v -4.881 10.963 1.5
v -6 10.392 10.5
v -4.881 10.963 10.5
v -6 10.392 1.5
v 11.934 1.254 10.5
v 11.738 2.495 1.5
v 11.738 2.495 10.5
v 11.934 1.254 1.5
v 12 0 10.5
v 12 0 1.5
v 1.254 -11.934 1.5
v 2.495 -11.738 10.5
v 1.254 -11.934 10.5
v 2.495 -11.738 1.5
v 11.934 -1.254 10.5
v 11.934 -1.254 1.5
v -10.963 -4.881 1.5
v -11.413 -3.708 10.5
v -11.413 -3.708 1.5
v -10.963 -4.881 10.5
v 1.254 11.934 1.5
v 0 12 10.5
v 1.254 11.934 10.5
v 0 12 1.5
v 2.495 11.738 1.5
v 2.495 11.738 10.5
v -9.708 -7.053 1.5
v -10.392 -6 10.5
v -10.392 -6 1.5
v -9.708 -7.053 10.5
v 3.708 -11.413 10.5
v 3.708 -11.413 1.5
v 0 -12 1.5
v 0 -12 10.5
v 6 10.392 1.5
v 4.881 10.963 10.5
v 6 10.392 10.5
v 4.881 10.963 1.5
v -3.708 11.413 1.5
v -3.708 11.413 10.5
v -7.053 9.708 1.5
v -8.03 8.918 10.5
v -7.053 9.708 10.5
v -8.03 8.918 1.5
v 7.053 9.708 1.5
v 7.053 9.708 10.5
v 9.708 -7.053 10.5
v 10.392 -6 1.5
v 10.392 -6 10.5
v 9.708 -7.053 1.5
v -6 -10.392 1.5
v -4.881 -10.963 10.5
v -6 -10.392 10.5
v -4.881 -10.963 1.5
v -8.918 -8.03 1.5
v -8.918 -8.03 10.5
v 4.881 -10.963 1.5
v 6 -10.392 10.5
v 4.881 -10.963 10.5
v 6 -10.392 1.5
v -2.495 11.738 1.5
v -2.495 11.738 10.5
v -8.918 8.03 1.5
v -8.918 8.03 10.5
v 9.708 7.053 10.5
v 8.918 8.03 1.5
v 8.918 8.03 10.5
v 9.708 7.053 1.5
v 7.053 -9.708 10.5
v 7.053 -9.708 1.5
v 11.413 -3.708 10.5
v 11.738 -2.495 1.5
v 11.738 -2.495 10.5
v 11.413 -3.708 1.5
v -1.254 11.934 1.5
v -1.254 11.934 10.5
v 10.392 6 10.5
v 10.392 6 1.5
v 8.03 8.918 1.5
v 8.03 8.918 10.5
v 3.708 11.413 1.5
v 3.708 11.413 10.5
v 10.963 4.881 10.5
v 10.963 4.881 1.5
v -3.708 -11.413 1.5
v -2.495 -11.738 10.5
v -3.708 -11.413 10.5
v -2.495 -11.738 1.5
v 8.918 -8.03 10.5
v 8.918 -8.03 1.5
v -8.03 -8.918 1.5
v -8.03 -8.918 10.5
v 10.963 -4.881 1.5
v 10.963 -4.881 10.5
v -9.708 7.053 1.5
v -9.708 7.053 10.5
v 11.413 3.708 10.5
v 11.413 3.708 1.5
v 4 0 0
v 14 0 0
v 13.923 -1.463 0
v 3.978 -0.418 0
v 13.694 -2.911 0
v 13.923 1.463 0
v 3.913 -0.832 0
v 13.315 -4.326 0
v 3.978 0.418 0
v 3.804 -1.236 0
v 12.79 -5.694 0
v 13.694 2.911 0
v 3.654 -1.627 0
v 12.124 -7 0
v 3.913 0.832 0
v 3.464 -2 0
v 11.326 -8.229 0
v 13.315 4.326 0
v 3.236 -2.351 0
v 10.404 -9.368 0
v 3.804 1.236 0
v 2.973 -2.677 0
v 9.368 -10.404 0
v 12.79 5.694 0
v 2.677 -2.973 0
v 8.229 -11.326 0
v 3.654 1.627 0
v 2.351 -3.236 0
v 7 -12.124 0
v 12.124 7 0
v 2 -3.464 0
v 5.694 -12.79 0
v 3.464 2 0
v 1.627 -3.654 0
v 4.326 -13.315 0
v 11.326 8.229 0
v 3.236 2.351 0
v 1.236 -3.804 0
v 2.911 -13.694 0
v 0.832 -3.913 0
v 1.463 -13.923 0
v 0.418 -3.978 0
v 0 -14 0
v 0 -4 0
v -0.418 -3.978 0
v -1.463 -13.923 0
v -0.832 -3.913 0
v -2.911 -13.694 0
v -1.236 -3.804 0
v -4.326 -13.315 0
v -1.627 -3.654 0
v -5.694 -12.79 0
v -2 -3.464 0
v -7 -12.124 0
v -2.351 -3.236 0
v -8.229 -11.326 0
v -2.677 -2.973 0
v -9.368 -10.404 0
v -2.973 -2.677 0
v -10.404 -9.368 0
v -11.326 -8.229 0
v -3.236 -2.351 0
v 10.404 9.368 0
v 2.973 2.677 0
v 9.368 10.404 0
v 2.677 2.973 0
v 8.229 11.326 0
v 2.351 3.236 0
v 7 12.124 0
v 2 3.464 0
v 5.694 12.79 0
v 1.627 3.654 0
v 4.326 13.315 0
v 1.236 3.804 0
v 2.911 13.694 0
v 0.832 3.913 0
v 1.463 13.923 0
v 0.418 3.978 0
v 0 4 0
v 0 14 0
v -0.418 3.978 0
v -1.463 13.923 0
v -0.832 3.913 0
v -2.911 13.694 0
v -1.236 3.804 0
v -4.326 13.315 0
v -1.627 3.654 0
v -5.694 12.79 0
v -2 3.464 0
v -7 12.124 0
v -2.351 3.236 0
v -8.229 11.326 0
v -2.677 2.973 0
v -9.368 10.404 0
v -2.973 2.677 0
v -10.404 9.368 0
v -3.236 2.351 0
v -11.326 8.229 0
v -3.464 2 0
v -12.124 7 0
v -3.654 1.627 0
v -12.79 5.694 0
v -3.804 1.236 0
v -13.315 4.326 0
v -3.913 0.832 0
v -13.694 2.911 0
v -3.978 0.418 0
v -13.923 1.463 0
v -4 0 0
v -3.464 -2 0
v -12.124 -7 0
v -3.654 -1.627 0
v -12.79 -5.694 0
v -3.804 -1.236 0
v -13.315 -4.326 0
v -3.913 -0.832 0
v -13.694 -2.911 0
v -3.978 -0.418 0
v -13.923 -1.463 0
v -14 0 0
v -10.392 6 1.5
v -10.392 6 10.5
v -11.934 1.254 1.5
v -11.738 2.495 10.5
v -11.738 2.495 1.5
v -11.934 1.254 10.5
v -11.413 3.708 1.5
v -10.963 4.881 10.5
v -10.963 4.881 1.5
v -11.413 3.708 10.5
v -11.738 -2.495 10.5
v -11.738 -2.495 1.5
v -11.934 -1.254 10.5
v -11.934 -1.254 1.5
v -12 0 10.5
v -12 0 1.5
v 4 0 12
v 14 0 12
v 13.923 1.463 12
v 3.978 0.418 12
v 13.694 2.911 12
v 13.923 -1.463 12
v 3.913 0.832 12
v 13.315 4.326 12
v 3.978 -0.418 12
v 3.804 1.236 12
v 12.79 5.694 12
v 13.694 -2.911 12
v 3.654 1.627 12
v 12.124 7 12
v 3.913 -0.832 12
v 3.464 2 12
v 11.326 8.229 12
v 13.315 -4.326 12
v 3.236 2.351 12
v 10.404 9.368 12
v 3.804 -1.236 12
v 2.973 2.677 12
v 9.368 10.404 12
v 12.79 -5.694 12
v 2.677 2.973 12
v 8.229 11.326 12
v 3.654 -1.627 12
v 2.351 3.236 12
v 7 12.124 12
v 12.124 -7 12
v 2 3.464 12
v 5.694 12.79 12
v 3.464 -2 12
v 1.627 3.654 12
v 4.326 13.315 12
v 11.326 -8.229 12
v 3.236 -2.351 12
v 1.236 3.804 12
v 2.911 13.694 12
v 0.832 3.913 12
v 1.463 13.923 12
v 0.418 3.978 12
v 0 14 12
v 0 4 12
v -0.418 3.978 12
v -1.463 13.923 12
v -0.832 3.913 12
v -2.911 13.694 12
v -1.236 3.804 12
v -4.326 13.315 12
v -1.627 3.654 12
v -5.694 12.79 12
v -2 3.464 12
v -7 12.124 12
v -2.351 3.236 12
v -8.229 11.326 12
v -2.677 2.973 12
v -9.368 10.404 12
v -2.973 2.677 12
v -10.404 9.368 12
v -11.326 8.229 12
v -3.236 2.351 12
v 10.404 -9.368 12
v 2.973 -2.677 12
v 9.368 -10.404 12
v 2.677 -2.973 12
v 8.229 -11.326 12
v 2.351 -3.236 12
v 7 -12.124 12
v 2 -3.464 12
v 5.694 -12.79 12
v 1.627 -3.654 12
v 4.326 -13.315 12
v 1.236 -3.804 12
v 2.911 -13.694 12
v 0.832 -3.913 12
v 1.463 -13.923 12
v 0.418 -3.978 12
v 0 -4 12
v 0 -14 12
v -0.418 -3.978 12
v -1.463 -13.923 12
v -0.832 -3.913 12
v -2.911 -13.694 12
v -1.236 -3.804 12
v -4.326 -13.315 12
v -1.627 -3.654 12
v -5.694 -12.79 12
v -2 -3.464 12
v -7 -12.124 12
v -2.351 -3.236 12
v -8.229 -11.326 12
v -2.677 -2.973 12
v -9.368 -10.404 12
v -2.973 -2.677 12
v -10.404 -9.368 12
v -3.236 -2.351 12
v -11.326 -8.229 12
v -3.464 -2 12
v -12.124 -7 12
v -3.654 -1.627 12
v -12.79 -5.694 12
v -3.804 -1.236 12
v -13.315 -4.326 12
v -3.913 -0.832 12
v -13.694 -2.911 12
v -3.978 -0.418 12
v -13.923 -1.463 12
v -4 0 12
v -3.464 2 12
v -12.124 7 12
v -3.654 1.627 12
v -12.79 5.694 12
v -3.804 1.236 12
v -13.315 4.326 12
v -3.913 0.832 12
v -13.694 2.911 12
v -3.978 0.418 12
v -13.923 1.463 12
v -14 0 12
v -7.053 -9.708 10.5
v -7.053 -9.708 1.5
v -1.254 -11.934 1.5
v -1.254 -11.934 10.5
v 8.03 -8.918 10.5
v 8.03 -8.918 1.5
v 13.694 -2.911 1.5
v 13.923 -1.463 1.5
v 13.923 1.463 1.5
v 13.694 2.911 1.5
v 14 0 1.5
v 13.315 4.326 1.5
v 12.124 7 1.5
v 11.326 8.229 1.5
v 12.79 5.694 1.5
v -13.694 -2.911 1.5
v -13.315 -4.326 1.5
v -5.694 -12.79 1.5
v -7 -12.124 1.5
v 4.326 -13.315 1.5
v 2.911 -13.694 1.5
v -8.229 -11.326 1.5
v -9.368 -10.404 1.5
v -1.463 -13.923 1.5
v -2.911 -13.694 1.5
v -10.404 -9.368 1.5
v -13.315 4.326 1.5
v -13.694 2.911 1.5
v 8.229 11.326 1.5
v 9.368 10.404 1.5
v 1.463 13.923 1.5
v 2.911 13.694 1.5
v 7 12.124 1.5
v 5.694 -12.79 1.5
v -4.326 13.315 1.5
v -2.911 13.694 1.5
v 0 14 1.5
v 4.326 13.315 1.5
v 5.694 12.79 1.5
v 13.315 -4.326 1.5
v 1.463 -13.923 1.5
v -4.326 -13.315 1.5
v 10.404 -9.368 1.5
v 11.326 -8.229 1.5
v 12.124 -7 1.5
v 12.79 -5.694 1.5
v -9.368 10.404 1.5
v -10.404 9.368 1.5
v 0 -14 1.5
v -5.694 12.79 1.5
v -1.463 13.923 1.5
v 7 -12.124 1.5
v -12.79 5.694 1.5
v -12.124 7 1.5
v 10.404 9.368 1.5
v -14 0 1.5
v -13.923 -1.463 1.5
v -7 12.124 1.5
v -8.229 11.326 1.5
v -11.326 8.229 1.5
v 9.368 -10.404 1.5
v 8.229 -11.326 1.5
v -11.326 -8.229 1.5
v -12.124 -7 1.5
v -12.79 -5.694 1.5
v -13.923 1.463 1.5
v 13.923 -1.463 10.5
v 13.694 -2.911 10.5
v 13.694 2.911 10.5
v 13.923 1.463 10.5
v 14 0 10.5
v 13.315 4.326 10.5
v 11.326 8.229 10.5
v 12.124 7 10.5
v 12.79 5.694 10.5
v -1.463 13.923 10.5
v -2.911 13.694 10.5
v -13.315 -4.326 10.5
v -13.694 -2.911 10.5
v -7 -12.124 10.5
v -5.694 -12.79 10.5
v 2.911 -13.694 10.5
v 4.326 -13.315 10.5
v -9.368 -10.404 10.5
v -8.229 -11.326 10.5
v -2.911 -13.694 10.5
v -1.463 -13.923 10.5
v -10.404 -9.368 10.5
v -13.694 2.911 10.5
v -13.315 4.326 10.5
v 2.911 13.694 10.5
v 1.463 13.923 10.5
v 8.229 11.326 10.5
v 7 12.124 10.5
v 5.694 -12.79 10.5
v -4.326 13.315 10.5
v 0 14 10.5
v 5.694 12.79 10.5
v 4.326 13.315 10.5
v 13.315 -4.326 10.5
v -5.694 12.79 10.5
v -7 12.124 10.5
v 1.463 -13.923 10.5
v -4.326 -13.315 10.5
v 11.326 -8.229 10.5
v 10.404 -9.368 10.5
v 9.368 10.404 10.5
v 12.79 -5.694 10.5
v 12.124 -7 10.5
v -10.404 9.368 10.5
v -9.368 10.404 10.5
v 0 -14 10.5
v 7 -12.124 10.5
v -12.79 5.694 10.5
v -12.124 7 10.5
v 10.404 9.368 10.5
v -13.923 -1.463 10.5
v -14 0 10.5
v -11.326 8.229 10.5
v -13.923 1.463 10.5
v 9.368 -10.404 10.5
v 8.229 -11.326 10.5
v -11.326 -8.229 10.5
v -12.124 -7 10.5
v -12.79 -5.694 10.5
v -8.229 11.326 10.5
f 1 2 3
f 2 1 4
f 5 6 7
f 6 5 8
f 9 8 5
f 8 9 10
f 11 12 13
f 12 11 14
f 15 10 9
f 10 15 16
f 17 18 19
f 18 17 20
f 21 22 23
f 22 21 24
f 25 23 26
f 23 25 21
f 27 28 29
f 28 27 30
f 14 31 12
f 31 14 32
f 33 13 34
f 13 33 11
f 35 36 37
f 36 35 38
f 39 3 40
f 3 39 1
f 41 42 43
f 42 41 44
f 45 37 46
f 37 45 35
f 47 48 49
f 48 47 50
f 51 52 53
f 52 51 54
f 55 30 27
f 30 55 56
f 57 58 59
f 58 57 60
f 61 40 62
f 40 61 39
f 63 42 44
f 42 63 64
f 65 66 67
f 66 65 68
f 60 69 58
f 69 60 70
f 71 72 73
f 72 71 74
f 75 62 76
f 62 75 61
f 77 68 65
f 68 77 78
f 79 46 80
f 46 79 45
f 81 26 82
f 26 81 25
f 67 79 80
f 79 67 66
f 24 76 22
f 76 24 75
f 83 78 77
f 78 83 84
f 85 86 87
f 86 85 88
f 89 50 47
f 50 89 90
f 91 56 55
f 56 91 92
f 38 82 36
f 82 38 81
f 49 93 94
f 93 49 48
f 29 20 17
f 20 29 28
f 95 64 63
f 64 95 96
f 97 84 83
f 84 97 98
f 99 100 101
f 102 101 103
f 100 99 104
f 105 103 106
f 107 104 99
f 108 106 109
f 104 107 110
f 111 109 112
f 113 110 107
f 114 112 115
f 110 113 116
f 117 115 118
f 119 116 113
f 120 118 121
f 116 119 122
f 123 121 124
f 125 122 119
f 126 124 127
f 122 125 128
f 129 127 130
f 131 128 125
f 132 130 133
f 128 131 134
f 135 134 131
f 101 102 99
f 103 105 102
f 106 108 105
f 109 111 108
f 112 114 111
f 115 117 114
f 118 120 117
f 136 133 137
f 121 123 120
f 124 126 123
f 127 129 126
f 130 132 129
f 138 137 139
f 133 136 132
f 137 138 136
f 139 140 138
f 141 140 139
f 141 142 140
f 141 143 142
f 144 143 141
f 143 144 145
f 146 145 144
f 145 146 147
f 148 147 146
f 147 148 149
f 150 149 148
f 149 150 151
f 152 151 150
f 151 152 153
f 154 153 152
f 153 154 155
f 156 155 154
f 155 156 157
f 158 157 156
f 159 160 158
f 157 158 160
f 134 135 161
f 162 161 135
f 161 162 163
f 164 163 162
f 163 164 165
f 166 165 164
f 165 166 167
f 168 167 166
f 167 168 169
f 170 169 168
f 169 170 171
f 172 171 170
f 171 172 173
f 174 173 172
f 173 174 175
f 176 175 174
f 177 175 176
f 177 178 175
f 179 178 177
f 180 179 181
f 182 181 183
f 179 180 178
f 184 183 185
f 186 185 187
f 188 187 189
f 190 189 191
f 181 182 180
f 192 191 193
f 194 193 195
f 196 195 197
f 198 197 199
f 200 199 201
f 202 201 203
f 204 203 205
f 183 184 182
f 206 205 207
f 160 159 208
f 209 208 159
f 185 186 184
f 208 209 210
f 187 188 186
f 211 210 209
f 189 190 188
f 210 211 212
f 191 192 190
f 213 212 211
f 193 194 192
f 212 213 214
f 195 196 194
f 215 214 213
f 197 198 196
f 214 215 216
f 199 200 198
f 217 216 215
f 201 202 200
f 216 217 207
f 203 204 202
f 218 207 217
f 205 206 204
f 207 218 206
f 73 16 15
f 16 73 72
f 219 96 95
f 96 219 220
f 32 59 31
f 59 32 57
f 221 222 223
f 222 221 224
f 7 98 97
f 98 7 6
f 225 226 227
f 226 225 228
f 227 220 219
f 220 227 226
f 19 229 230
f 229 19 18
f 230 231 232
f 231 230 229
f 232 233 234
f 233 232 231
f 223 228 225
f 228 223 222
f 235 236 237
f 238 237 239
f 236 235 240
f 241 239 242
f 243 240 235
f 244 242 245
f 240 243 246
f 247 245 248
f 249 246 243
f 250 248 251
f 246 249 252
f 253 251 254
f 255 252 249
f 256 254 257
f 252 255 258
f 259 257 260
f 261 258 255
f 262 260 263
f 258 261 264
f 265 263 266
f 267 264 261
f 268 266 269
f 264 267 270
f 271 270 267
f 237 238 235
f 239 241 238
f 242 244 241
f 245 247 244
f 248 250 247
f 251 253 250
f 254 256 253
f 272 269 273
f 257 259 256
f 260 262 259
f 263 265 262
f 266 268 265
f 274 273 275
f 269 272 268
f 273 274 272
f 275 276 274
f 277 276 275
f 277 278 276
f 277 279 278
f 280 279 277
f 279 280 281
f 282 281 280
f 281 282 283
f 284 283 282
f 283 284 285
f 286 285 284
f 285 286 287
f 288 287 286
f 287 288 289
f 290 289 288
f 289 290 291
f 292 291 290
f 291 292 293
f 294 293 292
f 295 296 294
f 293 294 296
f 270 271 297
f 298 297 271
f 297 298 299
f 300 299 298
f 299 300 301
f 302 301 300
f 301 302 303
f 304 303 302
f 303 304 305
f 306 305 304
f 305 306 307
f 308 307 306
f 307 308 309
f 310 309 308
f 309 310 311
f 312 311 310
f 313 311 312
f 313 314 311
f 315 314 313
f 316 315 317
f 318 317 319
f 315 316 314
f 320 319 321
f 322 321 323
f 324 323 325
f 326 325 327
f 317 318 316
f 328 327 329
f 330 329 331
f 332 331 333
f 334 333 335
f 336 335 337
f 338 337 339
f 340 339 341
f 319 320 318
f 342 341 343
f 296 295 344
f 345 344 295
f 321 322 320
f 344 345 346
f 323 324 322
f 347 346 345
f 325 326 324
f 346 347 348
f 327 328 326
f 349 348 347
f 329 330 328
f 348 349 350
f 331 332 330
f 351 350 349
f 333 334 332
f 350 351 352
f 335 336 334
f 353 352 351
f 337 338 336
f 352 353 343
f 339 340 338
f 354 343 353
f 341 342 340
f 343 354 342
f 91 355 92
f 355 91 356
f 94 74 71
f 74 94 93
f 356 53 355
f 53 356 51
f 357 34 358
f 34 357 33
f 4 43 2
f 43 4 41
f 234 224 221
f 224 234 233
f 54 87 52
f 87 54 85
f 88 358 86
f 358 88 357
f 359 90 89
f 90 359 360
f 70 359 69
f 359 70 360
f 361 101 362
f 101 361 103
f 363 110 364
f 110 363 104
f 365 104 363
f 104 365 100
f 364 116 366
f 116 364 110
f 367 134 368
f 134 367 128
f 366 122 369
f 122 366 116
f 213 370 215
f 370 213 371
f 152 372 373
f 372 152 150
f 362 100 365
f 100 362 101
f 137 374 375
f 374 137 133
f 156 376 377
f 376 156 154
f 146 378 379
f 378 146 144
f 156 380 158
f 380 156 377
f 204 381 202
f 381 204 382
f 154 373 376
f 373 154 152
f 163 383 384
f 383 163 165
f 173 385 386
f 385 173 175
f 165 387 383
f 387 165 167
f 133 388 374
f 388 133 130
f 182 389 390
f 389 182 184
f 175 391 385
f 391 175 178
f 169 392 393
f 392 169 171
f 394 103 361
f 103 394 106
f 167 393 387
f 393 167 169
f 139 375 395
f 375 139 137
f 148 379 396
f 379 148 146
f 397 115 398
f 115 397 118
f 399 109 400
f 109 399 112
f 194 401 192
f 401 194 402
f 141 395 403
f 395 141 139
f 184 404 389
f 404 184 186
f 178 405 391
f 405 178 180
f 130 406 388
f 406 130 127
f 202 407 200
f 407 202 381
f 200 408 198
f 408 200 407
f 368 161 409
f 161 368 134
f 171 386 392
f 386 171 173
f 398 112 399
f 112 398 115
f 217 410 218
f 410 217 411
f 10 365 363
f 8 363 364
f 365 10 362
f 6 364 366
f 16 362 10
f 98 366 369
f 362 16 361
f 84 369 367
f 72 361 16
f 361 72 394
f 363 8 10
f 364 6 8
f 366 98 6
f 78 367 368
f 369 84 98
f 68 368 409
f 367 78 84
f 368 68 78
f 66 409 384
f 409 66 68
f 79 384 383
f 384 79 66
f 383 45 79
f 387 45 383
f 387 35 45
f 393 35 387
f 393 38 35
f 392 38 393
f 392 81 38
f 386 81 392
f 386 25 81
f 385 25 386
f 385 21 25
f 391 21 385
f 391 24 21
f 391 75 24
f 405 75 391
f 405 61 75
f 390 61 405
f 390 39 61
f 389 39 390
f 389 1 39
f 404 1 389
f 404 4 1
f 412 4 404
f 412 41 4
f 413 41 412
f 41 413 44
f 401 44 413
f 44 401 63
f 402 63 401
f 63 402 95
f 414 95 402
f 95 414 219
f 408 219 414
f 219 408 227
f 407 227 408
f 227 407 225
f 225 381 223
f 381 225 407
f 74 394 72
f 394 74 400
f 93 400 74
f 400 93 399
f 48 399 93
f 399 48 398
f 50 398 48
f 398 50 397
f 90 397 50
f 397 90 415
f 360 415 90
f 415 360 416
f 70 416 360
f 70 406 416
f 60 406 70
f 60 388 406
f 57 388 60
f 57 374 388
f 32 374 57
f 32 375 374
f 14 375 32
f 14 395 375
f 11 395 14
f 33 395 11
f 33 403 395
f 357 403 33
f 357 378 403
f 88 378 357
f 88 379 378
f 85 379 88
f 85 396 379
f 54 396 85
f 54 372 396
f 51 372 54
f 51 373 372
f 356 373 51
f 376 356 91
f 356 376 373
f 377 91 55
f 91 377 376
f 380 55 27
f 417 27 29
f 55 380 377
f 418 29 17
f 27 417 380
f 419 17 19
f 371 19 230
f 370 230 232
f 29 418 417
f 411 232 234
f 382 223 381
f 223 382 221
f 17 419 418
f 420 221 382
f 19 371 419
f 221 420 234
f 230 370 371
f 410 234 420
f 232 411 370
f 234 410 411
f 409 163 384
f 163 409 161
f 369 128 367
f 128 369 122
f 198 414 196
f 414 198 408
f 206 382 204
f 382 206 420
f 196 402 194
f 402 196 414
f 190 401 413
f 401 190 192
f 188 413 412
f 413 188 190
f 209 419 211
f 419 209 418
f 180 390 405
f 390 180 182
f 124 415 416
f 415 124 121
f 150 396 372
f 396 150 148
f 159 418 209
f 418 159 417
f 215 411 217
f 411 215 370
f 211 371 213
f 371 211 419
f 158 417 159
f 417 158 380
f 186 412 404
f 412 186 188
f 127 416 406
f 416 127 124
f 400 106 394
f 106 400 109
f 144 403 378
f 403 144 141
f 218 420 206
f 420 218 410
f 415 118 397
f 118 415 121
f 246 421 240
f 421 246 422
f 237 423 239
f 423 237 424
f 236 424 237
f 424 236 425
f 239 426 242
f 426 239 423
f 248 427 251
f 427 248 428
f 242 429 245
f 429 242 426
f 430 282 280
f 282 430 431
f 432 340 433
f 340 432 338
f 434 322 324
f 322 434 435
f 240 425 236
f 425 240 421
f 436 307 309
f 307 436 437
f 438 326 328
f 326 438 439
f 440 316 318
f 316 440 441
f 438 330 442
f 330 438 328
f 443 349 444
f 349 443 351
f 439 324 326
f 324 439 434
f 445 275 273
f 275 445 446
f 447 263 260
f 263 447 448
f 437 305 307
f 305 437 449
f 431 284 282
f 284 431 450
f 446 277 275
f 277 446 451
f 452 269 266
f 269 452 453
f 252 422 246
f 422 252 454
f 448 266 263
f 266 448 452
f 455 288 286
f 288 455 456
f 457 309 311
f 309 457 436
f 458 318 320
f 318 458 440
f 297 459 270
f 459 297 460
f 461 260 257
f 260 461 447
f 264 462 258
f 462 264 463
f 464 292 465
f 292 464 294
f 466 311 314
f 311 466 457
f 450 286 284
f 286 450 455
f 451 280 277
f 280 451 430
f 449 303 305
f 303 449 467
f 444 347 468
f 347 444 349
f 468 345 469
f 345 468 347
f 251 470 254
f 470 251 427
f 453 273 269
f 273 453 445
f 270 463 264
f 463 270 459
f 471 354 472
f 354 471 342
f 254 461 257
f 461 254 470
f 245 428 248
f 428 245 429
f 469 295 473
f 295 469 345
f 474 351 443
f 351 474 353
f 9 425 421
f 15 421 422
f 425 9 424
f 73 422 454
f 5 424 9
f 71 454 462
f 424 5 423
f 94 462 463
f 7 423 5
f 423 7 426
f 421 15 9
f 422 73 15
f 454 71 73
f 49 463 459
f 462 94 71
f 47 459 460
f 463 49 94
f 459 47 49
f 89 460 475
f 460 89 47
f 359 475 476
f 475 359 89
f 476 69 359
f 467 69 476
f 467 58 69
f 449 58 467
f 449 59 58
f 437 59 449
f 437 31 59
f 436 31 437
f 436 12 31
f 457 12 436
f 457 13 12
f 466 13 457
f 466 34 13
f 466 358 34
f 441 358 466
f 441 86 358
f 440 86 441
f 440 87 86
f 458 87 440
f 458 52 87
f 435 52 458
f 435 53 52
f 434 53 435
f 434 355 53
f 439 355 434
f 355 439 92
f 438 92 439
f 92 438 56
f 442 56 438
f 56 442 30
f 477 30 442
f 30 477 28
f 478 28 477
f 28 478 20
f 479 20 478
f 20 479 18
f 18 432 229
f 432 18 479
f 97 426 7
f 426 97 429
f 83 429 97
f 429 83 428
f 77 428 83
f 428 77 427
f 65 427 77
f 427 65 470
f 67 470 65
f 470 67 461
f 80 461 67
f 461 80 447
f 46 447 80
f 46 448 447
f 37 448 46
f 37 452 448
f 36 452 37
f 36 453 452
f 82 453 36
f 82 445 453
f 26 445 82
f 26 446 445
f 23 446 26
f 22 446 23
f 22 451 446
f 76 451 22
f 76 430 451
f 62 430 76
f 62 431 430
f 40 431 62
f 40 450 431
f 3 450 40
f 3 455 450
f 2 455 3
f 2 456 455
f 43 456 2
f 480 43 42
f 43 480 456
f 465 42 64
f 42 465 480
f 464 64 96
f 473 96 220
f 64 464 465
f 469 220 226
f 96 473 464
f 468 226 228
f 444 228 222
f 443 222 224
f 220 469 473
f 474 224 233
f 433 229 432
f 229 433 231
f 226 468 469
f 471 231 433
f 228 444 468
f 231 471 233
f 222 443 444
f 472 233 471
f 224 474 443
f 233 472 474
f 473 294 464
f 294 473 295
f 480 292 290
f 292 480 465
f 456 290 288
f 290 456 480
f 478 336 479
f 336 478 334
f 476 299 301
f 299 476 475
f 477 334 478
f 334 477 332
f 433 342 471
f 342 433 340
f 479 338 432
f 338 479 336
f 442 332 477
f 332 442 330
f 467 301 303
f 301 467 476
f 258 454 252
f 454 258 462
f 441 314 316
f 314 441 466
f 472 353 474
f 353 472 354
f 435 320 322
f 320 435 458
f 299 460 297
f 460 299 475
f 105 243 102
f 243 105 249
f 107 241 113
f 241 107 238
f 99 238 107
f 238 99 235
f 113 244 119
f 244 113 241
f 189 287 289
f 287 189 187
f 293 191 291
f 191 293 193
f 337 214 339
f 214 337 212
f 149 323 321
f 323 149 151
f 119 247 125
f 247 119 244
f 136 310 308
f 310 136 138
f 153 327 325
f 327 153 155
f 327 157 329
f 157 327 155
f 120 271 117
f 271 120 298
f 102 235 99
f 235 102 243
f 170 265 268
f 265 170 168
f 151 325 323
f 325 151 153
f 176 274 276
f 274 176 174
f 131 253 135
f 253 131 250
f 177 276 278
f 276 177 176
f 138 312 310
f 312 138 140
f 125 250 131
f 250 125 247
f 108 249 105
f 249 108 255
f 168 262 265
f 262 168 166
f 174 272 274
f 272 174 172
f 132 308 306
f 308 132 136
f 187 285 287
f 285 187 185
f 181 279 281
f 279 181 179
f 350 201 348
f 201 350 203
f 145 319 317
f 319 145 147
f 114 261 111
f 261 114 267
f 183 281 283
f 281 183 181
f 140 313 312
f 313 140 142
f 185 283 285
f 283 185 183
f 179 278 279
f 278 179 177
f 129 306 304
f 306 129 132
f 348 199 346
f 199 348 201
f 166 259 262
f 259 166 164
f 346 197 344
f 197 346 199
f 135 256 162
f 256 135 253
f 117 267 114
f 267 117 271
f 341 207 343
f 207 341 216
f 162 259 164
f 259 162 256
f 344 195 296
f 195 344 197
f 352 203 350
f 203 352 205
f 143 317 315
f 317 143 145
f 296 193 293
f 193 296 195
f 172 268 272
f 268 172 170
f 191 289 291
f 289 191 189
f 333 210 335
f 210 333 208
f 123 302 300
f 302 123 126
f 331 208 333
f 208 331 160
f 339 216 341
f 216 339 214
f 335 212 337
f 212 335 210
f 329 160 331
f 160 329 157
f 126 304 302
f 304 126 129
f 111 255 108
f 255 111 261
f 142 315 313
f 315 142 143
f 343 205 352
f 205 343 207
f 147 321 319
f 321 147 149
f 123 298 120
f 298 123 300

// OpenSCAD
// Plain idler pulley with retaining flanges.
$fn = 60;
eps = 0.02;
bore_d = 8;
body_d = 24;
width = 12;
flange_t = 1.5;
difference() {
    union() {
        cylinder(d=body_d,h=width);
        cylinder(d=body_d+4,h=flange_t);
        translate([0,0,width-flange_t]) cylinder(d=body_d+4,h=flange_t);
    }
    translate([0,0,-eps]) cylinder(d=bore_d,h=width+2*eps);
}
